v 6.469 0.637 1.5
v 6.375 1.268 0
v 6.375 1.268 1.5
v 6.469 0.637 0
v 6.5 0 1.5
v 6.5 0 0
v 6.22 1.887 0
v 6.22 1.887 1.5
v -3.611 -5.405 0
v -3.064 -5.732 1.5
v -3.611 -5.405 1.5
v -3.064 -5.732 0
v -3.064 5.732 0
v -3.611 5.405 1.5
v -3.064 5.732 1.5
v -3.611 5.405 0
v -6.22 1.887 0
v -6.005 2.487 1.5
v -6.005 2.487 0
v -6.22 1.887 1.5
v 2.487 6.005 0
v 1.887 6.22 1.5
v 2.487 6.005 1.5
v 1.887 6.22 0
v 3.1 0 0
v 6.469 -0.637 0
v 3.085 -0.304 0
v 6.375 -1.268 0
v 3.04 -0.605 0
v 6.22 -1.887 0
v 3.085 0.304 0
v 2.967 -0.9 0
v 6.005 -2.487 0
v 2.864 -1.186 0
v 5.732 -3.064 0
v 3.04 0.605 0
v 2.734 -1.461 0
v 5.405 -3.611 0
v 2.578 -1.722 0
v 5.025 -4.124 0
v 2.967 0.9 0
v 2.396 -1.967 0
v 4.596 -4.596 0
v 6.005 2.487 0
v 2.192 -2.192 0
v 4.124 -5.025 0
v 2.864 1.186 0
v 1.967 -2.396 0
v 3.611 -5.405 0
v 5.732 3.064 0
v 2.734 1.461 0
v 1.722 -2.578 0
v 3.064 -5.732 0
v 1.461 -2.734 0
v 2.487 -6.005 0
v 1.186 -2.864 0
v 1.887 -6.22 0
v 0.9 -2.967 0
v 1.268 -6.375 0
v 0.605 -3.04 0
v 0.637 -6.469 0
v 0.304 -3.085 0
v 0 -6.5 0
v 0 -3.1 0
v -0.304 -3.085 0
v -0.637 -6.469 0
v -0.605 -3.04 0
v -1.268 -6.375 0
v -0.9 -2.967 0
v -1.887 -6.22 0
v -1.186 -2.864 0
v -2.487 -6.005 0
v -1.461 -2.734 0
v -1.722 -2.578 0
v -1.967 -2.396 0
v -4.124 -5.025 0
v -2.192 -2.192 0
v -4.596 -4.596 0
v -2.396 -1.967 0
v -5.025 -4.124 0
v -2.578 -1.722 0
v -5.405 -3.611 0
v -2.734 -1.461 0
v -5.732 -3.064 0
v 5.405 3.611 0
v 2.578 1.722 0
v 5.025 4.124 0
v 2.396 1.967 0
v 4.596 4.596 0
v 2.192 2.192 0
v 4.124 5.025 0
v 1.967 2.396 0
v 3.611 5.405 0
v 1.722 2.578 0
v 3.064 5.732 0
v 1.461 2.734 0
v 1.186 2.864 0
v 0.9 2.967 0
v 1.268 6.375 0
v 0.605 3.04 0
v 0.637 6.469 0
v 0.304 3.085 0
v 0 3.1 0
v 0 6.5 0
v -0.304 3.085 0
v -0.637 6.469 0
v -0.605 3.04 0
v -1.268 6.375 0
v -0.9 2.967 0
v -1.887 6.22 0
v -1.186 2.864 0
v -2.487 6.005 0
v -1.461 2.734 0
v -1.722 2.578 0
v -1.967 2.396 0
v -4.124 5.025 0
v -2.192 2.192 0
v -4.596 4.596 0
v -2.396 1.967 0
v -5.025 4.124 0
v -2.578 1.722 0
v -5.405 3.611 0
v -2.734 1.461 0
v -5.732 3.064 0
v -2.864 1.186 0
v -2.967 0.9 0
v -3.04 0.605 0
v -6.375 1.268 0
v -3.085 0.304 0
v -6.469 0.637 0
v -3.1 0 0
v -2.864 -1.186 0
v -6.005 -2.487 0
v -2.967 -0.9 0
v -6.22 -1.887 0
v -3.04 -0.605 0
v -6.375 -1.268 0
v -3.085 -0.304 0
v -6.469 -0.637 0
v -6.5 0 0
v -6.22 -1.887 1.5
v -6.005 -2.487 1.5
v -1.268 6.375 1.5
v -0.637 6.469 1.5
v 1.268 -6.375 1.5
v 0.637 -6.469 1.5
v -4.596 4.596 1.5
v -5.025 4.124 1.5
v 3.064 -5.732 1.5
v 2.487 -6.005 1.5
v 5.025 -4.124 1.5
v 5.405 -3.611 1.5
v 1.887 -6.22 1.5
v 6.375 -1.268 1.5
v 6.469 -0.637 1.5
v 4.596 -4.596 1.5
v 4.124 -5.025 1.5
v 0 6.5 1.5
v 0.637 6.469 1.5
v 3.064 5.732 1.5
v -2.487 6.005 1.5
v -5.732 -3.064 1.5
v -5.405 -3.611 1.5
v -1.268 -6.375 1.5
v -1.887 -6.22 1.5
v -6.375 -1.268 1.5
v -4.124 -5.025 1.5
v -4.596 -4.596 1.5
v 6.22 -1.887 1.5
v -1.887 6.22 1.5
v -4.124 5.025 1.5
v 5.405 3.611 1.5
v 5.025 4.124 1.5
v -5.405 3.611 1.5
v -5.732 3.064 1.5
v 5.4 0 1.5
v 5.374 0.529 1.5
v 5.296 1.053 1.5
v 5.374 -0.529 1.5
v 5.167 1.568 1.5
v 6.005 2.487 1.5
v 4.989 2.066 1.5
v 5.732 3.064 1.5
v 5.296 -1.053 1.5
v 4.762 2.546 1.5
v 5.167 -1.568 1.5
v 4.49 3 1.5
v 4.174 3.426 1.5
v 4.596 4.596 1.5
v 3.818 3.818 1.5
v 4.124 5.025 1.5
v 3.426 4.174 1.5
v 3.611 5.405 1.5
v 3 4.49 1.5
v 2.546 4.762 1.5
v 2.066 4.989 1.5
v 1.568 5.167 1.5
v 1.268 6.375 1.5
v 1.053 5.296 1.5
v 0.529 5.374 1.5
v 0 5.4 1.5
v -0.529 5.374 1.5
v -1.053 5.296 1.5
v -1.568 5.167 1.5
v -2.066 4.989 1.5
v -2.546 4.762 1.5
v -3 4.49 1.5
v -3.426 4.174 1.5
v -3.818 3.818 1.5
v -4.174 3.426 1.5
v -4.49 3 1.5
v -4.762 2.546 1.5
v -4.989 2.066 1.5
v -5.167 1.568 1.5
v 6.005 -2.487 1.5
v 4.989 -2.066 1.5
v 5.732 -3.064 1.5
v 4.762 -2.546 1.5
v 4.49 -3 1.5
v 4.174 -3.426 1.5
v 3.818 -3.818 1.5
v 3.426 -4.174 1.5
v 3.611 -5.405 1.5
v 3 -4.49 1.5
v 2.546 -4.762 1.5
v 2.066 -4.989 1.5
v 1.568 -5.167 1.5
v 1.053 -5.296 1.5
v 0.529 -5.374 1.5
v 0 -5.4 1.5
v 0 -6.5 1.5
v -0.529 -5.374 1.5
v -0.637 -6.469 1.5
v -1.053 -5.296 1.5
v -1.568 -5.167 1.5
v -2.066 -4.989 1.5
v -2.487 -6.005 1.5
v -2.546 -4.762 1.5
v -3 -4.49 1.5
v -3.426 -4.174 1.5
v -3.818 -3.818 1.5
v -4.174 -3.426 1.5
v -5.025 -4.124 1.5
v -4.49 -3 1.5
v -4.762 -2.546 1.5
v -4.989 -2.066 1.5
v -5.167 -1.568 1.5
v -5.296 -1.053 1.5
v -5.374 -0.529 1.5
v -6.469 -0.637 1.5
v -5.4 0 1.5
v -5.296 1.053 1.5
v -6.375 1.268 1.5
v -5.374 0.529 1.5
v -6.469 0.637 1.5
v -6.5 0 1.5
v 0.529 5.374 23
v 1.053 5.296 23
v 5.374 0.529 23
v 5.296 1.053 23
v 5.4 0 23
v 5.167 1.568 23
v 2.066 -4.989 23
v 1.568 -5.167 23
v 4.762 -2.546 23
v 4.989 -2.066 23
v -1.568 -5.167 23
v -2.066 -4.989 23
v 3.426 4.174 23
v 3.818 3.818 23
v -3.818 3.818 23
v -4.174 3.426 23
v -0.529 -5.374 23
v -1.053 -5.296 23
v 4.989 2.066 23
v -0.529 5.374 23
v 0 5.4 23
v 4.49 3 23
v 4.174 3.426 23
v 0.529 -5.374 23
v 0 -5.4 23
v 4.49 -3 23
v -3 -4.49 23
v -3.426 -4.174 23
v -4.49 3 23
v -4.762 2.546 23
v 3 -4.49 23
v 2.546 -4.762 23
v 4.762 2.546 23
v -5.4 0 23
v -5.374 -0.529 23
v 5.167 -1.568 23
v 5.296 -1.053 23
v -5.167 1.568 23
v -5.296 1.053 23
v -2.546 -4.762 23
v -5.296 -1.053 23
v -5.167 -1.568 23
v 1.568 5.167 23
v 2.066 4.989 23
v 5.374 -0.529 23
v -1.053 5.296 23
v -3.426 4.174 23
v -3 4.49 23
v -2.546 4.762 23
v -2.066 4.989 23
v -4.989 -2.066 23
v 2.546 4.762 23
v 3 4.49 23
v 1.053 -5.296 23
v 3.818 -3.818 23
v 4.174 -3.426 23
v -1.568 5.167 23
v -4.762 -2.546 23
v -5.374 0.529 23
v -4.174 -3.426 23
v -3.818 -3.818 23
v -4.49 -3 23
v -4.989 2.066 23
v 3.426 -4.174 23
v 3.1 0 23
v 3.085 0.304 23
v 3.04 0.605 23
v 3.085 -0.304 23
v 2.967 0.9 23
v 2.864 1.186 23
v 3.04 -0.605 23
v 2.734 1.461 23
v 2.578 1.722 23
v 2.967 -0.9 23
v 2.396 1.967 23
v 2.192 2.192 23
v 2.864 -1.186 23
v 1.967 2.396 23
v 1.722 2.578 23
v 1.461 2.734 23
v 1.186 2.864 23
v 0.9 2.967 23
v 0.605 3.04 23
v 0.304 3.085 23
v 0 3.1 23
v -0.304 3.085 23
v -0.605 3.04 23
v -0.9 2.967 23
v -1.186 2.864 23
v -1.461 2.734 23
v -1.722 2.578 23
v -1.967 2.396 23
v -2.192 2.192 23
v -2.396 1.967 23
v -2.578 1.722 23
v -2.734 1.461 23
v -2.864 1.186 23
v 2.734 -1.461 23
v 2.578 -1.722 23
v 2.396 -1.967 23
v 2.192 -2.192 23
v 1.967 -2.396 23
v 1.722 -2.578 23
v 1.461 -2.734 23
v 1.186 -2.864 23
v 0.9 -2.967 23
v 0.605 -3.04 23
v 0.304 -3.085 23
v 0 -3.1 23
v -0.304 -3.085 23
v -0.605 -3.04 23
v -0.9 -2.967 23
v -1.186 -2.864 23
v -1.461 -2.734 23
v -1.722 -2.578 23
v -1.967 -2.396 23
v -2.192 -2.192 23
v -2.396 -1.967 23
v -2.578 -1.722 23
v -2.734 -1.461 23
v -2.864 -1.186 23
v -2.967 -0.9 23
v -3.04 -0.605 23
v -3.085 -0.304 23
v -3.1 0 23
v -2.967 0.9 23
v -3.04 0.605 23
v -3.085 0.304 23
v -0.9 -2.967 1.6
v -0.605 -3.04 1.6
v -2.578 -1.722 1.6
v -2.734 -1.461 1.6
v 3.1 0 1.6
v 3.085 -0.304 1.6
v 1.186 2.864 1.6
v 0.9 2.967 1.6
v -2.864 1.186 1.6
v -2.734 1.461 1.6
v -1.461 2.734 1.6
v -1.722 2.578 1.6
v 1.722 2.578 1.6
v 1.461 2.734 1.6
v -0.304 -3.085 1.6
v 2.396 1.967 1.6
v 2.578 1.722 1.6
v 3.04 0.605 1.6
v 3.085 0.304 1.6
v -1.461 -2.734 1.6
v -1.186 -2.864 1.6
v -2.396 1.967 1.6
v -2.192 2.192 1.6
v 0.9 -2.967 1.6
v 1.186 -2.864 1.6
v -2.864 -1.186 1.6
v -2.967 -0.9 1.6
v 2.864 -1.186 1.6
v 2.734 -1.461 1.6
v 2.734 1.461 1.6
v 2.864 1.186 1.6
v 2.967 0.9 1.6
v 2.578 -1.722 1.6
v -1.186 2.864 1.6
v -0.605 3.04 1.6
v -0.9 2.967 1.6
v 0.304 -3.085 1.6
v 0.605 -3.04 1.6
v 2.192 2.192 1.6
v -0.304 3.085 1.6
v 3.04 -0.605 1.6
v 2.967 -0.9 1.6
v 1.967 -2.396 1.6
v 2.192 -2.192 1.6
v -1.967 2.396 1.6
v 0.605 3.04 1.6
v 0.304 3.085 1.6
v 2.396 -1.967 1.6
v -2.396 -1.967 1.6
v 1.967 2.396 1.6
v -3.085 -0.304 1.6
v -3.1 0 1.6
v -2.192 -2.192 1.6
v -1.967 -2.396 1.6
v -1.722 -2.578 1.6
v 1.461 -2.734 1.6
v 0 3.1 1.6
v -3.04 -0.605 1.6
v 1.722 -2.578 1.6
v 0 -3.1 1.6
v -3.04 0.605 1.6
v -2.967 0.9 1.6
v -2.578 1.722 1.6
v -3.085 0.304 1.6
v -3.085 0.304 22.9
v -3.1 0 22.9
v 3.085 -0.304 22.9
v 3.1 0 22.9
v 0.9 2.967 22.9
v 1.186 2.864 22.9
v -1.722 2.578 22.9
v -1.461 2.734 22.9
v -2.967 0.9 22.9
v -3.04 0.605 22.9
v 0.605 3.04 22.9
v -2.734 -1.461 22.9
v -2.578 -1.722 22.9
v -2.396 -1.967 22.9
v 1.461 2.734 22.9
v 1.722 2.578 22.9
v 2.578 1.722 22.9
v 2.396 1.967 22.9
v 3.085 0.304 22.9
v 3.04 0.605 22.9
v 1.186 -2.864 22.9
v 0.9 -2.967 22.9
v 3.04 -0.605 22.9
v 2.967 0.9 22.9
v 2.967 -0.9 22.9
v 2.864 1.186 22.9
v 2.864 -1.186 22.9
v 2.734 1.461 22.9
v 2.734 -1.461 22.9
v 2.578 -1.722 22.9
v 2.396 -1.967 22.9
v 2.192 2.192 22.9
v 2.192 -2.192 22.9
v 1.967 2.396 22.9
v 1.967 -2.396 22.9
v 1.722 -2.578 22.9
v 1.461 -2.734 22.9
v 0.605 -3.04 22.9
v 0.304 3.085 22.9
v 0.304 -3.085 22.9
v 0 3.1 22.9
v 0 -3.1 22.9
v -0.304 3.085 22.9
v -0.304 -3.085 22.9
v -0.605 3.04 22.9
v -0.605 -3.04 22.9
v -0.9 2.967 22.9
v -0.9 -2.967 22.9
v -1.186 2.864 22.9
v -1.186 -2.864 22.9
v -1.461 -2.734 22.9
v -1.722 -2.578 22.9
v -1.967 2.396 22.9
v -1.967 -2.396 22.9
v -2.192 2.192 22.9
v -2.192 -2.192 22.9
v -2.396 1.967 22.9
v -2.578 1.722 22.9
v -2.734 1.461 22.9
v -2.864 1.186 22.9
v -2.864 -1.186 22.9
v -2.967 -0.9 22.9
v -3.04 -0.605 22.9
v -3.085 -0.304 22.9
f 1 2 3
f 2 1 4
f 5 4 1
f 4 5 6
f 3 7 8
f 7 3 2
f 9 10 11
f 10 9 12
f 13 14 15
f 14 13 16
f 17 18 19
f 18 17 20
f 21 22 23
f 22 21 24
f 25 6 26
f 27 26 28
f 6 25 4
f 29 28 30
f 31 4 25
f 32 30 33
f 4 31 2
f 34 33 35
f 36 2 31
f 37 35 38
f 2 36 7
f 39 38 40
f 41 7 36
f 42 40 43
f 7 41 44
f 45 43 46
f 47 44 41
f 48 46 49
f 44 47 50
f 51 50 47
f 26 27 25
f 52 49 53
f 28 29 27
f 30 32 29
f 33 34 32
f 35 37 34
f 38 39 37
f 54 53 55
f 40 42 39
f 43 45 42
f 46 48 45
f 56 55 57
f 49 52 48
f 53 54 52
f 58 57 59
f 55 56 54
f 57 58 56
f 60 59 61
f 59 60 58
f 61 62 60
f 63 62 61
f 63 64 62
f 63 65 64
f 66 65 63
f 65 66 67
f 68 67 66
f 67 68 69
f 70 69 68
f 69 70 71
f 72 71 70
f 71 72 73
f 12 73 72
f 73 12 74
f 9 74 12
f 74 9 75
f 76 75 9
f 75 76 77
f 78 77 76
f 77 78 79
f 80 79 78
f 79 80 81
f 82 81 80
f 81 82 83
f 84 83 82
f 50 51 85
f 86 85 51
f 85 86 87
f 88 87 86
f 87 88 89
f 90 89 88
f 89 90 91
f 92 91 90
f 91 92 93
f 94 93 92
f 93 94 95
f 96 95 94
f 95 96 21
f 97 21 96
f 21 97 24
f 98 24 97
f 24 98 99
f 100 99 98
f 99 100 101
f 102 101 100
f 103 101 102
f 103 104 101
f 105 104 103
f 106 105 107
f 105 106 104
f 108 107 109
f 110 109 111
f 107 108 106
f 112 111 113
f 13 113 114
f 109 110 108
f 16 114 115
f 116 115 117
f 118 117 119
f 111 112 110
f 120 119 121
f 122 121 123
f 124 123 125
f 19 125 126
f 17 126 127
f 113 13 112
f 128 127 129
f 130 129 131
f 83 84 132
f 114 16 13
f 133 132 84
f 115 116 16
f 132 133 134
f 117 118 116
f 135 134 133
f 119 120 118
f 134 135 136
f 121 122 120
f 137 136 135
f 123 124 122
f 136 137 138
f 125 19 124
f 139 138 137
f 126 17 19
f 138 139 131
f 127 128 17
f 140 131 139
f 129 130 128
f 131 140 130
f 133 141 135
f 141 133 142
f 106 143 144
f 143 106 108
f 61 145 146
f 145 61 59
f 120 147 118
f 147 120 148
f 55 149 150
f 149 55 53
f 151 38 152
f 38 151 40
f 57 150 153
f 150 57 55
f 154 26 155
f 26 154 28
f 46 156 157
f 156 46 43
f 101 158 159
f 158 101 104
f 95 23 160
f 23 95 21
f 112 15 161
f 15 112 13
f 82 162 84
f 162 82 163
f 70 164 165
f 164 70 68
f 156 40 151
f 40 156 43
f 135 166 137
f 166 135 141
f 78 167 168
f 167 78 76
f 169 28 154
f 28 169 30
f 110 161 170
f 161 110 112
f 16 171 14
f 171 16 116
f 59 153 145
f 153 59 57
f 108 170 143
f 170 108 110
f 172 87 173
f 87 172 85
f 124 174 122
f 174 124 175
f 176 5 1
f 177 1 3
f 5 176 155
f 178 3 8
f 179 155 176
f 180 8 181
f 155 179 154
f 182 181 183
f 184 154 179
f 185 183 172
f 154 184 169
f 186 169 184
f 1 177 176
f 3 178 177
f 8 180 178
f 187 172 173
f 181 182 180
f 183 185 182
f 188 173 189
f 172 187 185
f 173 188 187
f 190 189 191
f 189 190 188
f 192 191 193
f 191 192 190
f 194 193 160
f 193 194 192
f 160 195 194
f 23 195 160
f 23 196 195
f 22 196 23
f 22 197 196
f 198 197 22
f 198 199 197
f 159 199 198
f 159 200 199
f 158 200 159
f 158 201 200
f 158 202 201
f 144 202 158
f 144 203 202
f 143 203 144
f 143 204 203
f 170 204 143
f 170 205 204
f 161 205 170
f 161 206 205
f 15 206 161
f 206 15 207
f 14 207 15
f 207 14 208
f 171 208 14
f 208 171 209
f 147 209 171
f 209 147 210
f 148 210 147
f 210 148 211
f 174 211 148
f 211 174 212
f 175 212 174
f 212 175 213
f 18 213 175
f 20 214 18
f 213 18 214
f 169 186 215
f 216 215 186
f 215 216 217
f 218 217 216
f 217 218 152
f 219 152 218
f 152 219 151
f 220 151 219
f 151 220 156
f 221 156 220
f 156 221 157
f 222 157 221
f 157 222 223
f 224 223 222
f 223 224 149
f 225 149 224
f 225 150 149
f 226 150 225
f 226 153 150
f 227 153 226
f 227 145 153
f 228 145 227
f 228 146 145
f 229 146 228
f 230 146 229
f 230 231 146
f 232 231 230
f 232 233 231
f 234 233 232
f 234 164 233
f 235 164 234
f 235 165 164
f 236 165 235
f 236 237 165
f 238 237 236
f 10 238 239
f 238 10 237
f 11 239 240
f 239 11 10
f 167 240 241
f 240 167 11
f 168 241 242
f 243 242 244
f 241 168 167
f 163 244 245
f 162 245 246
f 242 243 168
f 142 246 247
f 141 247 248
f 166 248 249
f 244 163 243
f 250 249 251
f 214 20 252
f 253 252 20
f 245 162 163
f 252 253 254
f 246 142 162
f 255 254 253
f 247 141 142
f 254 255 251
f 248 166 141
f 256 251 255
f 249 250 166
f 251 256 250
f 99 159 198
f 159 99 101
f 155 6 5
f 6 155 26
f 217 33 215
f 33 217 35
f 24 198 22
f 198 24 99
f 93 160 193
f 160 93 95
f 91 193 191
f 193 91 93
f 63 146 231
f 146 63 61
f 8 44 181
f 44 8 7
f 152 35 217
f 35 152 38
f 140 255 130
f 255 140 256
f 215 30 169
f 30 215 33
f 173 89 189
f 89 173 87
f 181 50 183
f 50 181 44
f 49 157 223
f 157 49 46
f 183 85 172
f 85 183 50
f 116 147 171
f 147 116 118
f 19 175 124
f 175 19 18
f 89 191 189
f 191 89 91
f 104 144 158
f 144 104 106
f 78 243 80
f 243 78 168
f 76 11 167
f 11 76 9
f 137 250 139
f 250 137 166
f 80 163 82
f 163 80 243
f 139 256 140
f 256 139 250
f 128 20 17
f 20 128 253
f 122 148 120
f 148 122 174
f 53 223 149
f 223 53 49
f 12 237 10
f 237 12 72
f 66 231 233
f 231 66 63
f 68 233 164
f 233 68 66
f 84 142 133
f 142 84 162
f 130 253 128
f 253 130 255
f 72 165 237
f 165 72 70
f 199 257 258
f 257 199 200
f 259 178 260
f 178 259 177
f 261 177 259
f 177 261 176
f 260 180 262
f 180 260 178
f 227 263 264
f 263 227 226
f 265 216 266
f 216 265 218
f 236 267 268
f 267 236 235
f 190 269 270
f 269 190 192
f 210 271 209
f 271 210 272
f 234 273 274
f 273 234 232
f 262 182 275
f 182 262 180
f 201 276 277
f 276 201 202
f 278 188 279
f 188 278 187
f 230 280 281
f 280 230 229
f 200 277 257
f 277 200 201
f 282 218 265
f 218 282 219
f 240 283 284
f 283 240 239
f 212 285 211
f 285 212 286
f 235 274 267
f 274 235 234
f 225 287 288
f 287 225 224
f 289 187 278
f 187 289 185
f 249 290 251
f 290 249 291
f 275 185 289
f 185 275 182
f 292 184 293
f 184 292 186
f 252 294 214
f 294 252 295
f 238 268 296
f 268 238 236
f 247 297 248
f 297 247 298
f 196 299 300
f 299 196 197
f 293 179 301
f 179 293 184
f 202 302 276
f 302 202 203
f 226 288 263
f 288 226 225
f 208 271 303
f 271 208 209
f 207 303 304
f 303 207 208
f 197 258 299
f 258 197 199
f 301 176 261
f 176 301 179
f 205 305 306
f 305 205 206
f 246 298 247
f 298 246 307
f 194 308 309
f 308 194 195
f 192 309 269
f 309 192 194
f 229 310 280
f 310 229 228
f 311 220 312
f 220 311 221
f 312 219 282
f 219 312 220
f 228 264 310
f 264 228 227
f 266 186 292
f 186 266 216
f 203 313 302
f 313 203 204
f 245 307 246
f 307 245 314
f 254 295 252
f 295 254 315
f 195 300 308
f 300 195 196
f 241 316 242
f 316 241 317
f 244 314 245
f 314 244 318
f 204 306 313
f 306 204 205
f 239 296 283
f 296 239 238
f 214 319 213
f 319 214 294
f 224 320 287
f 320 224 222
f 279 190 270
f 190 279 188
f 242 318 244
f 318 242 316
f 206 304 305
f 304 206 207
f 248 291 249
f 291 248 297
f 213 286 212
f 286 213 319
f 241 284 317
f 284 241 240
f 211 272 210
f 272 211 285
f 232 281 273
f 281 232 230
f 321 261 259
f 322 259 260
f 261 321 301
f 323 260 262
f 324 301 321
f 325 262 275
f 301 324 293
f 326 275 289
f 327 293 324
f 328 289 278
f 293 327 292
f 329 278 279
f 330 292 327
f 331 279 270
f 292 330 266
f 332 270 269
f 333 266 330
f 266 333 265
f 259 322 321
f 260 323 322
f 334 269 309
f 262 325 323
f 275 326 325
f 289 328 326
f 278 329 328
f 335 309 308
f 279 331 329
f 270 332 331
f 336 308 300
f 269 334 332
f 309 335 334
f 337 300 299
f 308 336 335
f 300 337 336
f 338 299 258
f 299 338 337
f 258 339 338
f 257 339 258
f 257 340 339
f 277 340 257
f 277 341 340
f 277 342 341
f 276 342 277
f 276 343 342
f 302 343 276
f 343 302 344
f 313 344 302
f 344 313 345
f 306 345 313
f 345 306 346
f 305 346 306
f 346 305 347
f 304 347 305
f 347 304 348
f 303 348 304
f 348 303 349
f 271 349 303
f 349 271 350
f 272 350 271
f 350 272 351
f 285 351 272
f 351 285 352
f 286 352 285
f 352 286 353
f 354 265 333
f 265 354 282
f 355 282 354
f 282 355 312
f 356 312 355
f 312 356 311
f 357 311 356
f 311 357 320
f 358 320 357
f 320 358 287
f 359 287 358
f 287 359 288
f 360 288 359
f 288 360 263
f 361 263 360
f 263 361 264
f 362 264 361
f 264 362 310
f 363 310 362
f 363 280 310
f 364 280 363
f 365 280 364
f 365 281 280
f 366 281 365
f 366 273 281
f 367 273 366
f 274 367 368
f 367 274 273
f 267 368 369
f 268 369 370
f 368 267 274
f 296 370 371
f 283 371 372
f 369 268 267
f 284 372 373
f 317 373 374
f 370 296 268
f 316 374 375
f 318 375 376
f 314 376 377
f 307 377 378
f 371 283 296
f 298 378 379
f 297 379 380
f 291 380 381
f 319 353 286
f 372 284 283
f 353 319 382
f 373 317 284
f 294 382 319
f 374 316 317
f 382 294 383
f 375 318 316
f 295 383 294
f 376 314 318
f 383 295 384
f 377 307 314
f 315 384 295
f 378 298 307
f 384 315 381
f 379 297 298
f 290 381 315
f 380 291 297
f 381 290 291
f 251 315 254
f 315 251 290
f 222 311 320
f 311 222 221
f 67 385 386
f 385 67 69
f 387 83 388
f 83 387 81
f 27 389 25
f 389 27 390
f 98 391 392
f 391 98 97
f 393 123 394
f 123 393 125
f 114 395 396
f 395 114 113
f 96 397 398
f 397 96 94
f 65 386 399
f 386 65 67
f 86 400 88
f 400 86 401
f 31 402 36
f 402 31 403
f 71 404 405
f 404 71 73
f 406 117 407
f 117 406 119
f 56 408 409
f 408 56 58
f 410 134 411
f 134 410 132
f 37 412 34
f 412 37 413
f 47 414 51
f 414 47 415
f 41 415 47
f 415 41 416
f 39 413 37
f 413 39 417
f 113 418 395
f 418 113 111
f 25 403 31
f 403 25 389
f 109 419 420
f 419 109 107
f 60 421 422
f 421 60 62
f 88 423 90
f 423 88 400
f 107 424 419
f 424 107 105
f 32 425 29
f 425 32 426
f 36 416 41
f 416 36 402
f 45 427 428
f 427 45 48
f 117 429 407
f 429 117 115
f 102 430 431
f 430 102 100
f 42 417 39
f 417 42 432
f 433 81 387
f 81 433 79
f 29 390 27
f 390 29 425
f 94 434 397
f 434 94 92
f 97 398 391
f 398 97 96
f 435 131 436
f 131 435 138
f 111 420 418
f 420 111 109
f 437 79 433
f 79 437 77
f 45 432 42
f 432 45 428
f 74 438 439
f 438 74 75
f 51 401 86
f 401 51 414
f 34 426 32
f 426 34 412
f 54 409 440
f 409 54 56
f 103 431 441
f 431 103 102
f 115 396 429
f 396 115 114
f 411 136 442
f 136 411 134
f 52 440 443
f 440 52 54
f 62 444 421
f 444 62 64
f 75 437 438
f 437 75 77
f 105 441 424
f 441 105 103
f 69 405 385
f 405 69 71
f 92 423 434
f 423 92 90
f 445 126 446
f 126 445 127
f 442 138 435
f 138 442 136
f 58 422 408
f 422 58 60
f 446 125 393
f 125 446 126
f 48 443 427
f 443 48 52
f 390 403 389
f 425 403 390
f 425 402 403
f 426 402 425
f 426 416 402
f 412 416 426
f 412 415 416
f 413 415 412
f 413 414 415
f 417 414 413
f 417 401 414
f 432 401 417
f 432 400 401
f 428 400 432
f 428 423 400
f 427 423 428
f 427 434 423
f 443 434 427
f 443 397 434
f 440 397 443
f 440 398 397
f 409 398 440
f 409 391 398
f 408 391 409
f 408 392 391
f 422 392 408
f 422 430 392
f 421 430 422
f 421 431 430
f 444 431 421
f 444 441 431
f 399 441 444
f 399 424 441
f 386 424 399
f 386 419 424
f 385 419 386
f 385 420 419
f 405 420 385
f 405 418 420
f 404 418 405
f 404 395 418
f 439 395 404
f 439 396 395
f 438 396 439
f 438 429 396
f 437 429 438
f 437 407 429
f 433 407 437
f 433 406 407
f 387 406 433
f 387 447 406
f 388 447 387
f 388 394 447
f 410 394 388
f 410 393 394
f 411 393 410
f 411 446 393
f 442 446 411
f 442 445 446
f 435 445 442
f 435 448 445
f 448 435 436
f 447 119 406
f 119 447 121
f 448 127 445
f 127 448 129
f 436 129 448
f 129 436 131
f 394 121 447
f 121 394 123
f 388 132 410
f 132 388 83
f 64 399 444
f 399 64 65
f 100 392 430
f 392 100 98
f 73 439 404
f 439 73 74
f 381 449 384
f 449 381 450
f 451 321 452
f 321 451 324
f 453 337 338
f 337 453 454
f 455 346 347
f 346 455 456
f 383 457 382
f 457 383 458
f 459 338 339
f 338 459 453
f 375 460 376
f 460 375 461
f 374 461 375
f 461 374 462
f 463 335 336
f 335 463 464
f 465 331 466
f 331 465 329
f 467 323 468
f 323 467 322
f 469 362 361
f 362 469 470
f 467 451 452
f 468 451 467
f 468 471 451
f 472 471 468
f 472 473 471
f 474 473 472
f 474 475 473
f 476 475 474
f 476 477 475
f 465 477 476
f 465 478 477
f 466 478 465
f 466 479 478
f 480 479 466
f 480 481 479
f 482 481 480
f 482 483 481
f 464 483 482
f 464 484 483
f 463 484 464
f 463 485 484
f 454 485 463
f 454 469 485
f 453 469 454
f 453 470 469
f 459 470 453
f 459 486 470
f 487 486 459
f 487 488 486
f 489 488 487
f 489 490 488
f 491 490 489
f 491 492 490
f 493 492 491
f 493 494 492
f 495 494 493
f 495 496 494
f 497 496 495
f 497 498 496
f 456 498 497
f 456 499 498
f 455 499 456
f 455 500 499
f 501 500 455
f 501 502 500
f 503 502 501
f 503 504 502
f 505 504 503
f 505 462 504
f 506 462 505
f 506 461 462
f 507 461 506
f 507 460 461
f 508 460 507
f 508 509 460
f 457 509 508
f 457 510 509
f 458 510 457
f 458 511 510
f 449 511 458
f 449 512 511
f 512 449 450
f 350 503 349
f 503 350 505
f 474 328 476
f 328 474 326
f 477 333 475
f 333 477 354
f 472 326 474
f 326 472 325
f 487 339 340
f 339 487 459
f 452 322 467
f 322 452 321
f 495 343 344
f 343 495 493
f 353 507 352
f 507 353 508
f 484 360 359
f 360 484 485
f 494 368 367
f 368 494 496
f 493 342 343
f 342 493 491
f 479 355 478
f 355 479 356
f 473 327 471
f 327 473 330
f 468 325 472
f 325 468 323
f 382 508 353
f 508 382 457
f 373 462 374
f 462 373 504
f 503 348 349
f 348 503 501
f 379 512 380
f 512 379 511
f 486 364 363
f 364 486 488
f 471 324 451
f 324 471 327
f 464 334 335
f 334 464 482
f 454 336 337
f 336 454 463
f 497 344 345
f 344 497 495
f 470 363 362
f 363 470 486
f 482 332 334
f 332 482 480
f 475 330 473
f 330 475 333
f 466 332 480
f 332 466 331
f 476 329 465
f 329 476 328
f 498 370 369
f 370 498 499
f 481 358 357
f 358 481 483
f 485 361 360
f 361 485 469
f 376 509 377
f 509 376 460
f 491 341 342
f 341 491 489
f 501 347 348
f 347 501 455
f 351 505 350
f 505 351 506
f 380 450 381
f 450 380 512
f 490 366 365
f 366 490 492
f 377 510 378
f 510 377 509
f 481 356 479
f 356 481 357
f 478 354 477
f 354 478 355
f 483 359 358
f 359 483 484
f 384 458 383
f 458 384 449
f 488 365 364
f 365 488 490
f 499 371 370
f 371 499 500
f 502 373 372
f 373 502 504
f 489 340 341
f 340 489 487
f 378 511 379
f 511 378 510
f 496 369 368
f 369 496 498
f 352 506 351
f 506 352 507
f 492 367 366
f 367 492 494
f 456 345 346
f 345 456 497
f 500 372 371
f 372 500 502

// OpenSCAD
// Dimensions for 0.2 mL PCR Tube Adapter
// Units: mm

// Outer dimensions
sleeve_od = 10.8;      // Outer diameter of the main body
collar_od = 13.0;      // Outer diameter of the base collar
collar_h = 1.5;        // Height of the base collar
sleeve_h = 21.5;       // Total height of the sleeve body

// Bore dimensions
bore_d = 6.2;          // Diameter of the bore (hole)
bore_h = 22.0;         // Height of the bore (slightly taller than sleeve to ensure clearance)

// Tolerances and printing settings
$fn = 64;              // Resolution for curved surfaces
wall_thick = 1.0;      // Wall thickness of the sleeve
tolerance = 0.1;       // Small tolerance for cutting shapes

// Derived dimensions
sleeve_id = sleeve_od - (2 * wall_thick);
collar_id = collar_od - (2 * wall_thick);

module main() {
    union() {
        // 1. Base Collar (Rests on bed)
        // We use a cylinder for the collar, but we need to cut the bore through it
        // and the main body.
        
        // Construct the collar with the bore
        cylinder(d = collar_od, h = collar_h, center = false);
        
        // Construct the main body with the bore
        // The body starts at z = collar_h
        translate([0, 0, collar_h]) {
            cylinder(d = sleeve_od, h = sleeve_h, center = false);
        }
    }
}

module cutouts() {
    // We need to cut the bore through the entire object.
    // We extend the cutting shape slightly past the top and bottom
    // to ensure clean separation (Rule 5).
    
    // Bottom cut (through collar)
    cylinder(d = bore_d, h = collar_h + tolerance, center = false);
    
    // Top cut (through body)
    translate([0, 0, collar_h + sleeve_h - tolerance]) {
        cylinder(d = bore_d, h = tolerance, center = false);
    }
}

// Render the part
difference() {
    main();
    cutouts();
}
